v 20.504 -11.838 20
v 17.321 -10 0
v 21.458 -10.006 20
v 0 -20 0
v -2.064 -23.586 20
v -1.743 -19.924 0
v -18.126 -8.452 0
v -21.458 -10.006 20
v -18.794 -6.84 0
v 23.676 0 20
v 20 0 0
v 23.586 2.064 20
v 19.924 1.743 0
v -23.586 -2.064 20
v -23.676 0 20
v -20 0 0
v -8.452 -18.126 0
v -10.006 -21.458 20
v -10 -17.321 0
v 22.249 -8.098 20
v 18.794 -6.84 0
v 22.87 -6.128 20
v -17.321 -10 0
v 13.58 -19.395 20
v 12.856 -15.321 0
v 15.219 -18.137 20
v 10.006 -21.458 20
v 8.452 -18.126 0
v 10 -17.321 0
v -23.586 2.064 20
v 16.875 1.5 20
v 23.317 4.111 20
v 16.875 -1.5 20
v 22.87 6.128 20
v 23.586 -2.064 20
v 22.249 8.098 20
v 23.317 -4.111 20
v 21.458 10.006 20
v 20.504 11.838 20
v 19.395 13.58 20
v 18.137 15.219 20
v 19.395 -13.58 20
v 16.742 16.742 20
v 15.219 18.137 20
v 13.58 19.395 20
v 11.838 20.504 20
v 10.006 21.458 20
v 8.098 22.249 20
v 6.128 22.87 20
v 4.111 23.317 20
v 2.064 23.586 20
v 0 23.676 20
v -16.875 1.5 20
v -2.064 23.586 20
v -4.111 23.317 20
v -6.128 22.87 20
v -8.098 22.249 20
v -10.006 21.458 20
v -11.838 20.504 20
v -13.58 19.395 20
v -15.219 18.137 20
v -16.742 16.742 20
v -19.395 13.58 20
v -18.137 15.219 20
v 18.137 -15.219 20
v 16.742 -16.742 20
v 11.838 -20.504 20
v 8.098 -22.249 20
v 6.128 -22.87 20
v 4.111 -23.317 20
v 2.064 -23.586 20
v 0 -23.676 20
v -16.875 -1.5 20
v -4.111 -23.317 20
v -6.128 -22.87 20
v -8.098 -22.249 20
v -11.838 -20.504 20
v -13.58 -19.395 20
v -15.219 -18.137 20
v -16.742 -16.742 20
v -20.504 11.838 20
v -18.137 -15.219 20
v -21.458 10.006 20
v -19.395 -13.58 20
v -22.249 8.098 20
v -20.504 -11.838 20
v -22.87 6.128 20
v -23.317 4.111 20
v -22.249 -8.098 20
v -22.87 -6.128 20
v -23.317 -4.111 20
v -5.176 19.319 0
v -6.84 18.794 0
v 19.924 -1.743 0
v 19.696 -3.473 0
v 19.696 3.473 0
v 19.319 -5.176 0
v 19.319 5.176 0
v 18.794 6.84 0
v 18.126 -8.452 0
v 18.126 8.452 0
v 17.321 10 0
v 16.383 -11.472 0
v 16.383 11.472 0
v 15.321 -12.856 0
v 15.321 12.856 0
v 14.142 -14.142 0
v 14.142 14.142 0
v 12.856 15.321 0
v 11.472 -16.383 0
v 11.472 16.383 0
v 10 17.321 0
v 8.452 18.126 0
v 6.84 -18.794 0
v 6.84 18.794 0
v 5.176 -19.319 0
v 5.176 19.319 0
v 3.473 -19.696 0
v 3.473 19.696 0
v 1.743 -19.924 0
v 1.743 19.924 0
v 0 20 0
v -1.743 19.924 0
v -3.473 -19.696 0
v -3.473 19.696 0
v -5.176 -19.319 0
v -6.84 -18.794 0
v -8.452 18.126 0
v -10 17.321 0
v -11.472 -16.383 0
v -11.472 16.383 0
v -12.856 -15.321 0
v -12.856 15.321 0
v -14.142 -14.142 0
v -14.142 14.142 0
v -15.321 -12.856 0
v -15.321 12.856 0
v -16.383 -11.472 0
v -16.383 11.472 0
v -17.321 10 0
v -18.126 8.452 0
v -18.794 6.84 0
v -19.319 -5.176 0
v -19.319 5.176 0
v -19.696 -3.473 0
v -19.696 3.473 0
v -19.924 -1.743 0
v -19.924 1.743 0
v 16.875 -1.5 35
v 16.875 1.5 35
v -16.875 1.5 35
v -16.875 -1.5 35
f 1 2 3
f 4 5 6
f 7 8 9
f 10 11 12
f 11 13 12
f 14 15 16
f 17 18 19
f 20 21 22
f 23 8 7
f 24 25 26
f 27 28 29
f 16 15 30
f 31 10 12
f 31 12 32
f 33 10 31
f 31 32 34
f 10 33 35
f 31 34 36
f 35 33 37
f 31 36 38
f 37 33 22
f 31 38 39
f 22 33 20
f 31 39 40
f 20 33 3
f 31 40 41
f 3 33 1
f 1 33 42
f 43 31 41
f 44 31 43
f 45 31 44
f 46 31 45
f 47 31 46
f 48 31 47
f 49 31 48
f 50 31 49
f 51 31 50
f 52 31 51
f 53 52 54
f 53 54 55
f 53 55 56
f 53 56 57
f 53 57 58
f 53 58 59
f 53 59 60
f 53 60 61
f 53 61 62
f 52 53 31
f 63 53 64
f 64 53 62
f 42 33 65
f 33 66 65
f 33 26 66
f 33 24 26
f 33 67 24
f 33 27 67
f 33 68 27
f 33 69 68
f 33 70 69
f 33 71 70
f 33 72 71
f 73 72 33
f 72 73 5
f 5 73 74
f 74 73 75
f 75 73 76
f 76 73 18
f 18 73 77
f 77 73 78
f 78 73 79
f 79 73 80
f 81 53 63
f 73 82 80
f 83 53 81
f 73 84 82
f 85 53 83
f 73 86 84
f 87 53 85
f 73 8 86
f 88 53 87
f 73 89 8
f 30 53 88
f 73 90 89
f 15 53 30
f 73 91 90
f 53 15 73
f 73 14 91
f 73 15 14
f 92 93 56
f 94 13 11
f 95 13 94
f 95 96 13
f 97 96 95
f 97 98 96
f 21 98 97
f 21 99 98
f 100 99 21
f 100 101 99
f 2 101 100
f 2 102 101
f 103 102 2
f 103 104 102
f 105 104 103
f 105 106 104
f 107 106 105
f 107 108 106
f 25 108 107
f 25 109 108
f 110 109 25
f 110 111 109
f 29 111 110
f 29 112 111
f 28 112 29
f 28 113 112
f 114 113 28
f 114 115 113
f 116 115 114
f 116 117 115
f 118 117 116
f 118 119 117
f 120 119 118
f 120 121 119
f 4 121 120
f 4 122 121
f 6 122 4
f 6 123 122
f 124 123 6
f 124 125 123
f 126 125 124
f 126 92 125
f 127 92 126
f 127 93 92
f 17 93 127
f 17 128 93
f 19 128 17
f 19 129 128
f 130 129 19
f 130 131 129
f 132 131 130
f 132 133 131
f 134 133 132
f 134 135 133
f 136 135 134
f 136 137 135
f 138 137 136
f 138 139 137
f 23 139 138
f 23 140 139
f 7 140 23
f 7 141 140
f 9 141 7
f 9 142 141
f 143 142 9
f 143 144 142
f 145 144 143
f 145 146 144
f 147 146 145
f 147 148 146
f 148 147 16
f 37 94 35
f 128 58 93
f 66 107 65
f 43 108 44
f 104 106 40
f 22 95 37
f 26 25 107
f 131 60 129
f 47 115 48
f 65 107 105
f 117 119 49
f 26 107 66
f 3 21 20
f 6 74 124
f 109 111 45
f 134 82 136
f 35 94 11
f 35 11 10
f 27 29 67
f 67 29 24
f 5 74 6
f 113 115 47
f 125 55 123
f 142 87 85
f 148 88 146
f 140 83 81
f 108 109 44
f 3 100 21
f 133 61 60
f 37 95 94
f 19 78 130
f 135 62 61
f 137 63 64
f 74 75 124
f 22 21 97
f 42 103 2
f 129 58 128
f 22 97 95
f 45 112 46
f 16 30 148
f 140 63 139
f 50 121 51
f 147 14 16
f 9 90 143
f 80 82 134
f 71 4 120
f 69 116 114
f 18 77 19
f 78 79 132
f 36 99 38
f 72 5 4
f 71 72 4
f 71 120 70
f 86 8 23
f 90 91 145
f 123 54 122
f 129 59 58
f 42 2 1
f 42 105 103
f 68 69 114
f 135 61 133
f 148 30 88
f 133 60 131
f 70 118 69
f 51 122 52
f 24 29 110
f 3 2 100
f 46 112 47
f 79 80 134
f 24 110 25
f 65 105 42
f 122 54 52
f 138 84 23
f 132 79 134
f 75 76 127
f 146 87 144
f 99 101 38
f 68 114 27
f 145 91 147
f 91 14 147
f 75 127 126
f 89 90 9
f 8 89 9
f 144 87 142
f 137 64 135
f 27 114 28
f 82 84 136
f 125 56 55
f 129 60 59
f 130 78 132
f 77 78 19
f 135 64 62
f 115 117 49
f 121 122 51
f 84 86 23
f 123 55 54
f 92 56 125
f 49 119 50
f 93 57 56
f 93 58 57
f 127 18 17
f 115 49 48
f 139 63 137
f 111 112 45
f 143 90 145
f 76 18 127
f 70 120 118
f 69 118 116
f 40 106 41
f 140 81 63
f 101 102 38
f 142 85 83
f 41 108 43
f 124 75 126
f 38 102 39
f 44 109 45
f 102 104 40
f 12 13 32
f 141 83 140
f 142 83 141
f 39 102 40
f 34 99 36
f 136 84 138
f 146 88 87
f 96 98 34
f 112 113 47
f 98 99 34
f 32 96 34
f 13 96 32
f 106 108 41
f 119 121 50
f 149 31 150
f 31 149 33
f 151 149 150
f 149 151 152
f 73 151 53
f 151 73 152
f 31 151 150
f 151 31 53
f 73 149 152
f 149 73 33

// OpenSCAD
$fn=72;
d1 = 40;
d2 = 45;
h = 13.6;

h_target = 20;

d_top = d1+2 * ((d2-d1)/2.0 / h) * h_target;
cylinder(d1=40, d2=d_top, h=h_target);

w = d2*0.75;
l = 3;
translate([-w/2, -l/2, h_target])
cube([w, l, 15]);
